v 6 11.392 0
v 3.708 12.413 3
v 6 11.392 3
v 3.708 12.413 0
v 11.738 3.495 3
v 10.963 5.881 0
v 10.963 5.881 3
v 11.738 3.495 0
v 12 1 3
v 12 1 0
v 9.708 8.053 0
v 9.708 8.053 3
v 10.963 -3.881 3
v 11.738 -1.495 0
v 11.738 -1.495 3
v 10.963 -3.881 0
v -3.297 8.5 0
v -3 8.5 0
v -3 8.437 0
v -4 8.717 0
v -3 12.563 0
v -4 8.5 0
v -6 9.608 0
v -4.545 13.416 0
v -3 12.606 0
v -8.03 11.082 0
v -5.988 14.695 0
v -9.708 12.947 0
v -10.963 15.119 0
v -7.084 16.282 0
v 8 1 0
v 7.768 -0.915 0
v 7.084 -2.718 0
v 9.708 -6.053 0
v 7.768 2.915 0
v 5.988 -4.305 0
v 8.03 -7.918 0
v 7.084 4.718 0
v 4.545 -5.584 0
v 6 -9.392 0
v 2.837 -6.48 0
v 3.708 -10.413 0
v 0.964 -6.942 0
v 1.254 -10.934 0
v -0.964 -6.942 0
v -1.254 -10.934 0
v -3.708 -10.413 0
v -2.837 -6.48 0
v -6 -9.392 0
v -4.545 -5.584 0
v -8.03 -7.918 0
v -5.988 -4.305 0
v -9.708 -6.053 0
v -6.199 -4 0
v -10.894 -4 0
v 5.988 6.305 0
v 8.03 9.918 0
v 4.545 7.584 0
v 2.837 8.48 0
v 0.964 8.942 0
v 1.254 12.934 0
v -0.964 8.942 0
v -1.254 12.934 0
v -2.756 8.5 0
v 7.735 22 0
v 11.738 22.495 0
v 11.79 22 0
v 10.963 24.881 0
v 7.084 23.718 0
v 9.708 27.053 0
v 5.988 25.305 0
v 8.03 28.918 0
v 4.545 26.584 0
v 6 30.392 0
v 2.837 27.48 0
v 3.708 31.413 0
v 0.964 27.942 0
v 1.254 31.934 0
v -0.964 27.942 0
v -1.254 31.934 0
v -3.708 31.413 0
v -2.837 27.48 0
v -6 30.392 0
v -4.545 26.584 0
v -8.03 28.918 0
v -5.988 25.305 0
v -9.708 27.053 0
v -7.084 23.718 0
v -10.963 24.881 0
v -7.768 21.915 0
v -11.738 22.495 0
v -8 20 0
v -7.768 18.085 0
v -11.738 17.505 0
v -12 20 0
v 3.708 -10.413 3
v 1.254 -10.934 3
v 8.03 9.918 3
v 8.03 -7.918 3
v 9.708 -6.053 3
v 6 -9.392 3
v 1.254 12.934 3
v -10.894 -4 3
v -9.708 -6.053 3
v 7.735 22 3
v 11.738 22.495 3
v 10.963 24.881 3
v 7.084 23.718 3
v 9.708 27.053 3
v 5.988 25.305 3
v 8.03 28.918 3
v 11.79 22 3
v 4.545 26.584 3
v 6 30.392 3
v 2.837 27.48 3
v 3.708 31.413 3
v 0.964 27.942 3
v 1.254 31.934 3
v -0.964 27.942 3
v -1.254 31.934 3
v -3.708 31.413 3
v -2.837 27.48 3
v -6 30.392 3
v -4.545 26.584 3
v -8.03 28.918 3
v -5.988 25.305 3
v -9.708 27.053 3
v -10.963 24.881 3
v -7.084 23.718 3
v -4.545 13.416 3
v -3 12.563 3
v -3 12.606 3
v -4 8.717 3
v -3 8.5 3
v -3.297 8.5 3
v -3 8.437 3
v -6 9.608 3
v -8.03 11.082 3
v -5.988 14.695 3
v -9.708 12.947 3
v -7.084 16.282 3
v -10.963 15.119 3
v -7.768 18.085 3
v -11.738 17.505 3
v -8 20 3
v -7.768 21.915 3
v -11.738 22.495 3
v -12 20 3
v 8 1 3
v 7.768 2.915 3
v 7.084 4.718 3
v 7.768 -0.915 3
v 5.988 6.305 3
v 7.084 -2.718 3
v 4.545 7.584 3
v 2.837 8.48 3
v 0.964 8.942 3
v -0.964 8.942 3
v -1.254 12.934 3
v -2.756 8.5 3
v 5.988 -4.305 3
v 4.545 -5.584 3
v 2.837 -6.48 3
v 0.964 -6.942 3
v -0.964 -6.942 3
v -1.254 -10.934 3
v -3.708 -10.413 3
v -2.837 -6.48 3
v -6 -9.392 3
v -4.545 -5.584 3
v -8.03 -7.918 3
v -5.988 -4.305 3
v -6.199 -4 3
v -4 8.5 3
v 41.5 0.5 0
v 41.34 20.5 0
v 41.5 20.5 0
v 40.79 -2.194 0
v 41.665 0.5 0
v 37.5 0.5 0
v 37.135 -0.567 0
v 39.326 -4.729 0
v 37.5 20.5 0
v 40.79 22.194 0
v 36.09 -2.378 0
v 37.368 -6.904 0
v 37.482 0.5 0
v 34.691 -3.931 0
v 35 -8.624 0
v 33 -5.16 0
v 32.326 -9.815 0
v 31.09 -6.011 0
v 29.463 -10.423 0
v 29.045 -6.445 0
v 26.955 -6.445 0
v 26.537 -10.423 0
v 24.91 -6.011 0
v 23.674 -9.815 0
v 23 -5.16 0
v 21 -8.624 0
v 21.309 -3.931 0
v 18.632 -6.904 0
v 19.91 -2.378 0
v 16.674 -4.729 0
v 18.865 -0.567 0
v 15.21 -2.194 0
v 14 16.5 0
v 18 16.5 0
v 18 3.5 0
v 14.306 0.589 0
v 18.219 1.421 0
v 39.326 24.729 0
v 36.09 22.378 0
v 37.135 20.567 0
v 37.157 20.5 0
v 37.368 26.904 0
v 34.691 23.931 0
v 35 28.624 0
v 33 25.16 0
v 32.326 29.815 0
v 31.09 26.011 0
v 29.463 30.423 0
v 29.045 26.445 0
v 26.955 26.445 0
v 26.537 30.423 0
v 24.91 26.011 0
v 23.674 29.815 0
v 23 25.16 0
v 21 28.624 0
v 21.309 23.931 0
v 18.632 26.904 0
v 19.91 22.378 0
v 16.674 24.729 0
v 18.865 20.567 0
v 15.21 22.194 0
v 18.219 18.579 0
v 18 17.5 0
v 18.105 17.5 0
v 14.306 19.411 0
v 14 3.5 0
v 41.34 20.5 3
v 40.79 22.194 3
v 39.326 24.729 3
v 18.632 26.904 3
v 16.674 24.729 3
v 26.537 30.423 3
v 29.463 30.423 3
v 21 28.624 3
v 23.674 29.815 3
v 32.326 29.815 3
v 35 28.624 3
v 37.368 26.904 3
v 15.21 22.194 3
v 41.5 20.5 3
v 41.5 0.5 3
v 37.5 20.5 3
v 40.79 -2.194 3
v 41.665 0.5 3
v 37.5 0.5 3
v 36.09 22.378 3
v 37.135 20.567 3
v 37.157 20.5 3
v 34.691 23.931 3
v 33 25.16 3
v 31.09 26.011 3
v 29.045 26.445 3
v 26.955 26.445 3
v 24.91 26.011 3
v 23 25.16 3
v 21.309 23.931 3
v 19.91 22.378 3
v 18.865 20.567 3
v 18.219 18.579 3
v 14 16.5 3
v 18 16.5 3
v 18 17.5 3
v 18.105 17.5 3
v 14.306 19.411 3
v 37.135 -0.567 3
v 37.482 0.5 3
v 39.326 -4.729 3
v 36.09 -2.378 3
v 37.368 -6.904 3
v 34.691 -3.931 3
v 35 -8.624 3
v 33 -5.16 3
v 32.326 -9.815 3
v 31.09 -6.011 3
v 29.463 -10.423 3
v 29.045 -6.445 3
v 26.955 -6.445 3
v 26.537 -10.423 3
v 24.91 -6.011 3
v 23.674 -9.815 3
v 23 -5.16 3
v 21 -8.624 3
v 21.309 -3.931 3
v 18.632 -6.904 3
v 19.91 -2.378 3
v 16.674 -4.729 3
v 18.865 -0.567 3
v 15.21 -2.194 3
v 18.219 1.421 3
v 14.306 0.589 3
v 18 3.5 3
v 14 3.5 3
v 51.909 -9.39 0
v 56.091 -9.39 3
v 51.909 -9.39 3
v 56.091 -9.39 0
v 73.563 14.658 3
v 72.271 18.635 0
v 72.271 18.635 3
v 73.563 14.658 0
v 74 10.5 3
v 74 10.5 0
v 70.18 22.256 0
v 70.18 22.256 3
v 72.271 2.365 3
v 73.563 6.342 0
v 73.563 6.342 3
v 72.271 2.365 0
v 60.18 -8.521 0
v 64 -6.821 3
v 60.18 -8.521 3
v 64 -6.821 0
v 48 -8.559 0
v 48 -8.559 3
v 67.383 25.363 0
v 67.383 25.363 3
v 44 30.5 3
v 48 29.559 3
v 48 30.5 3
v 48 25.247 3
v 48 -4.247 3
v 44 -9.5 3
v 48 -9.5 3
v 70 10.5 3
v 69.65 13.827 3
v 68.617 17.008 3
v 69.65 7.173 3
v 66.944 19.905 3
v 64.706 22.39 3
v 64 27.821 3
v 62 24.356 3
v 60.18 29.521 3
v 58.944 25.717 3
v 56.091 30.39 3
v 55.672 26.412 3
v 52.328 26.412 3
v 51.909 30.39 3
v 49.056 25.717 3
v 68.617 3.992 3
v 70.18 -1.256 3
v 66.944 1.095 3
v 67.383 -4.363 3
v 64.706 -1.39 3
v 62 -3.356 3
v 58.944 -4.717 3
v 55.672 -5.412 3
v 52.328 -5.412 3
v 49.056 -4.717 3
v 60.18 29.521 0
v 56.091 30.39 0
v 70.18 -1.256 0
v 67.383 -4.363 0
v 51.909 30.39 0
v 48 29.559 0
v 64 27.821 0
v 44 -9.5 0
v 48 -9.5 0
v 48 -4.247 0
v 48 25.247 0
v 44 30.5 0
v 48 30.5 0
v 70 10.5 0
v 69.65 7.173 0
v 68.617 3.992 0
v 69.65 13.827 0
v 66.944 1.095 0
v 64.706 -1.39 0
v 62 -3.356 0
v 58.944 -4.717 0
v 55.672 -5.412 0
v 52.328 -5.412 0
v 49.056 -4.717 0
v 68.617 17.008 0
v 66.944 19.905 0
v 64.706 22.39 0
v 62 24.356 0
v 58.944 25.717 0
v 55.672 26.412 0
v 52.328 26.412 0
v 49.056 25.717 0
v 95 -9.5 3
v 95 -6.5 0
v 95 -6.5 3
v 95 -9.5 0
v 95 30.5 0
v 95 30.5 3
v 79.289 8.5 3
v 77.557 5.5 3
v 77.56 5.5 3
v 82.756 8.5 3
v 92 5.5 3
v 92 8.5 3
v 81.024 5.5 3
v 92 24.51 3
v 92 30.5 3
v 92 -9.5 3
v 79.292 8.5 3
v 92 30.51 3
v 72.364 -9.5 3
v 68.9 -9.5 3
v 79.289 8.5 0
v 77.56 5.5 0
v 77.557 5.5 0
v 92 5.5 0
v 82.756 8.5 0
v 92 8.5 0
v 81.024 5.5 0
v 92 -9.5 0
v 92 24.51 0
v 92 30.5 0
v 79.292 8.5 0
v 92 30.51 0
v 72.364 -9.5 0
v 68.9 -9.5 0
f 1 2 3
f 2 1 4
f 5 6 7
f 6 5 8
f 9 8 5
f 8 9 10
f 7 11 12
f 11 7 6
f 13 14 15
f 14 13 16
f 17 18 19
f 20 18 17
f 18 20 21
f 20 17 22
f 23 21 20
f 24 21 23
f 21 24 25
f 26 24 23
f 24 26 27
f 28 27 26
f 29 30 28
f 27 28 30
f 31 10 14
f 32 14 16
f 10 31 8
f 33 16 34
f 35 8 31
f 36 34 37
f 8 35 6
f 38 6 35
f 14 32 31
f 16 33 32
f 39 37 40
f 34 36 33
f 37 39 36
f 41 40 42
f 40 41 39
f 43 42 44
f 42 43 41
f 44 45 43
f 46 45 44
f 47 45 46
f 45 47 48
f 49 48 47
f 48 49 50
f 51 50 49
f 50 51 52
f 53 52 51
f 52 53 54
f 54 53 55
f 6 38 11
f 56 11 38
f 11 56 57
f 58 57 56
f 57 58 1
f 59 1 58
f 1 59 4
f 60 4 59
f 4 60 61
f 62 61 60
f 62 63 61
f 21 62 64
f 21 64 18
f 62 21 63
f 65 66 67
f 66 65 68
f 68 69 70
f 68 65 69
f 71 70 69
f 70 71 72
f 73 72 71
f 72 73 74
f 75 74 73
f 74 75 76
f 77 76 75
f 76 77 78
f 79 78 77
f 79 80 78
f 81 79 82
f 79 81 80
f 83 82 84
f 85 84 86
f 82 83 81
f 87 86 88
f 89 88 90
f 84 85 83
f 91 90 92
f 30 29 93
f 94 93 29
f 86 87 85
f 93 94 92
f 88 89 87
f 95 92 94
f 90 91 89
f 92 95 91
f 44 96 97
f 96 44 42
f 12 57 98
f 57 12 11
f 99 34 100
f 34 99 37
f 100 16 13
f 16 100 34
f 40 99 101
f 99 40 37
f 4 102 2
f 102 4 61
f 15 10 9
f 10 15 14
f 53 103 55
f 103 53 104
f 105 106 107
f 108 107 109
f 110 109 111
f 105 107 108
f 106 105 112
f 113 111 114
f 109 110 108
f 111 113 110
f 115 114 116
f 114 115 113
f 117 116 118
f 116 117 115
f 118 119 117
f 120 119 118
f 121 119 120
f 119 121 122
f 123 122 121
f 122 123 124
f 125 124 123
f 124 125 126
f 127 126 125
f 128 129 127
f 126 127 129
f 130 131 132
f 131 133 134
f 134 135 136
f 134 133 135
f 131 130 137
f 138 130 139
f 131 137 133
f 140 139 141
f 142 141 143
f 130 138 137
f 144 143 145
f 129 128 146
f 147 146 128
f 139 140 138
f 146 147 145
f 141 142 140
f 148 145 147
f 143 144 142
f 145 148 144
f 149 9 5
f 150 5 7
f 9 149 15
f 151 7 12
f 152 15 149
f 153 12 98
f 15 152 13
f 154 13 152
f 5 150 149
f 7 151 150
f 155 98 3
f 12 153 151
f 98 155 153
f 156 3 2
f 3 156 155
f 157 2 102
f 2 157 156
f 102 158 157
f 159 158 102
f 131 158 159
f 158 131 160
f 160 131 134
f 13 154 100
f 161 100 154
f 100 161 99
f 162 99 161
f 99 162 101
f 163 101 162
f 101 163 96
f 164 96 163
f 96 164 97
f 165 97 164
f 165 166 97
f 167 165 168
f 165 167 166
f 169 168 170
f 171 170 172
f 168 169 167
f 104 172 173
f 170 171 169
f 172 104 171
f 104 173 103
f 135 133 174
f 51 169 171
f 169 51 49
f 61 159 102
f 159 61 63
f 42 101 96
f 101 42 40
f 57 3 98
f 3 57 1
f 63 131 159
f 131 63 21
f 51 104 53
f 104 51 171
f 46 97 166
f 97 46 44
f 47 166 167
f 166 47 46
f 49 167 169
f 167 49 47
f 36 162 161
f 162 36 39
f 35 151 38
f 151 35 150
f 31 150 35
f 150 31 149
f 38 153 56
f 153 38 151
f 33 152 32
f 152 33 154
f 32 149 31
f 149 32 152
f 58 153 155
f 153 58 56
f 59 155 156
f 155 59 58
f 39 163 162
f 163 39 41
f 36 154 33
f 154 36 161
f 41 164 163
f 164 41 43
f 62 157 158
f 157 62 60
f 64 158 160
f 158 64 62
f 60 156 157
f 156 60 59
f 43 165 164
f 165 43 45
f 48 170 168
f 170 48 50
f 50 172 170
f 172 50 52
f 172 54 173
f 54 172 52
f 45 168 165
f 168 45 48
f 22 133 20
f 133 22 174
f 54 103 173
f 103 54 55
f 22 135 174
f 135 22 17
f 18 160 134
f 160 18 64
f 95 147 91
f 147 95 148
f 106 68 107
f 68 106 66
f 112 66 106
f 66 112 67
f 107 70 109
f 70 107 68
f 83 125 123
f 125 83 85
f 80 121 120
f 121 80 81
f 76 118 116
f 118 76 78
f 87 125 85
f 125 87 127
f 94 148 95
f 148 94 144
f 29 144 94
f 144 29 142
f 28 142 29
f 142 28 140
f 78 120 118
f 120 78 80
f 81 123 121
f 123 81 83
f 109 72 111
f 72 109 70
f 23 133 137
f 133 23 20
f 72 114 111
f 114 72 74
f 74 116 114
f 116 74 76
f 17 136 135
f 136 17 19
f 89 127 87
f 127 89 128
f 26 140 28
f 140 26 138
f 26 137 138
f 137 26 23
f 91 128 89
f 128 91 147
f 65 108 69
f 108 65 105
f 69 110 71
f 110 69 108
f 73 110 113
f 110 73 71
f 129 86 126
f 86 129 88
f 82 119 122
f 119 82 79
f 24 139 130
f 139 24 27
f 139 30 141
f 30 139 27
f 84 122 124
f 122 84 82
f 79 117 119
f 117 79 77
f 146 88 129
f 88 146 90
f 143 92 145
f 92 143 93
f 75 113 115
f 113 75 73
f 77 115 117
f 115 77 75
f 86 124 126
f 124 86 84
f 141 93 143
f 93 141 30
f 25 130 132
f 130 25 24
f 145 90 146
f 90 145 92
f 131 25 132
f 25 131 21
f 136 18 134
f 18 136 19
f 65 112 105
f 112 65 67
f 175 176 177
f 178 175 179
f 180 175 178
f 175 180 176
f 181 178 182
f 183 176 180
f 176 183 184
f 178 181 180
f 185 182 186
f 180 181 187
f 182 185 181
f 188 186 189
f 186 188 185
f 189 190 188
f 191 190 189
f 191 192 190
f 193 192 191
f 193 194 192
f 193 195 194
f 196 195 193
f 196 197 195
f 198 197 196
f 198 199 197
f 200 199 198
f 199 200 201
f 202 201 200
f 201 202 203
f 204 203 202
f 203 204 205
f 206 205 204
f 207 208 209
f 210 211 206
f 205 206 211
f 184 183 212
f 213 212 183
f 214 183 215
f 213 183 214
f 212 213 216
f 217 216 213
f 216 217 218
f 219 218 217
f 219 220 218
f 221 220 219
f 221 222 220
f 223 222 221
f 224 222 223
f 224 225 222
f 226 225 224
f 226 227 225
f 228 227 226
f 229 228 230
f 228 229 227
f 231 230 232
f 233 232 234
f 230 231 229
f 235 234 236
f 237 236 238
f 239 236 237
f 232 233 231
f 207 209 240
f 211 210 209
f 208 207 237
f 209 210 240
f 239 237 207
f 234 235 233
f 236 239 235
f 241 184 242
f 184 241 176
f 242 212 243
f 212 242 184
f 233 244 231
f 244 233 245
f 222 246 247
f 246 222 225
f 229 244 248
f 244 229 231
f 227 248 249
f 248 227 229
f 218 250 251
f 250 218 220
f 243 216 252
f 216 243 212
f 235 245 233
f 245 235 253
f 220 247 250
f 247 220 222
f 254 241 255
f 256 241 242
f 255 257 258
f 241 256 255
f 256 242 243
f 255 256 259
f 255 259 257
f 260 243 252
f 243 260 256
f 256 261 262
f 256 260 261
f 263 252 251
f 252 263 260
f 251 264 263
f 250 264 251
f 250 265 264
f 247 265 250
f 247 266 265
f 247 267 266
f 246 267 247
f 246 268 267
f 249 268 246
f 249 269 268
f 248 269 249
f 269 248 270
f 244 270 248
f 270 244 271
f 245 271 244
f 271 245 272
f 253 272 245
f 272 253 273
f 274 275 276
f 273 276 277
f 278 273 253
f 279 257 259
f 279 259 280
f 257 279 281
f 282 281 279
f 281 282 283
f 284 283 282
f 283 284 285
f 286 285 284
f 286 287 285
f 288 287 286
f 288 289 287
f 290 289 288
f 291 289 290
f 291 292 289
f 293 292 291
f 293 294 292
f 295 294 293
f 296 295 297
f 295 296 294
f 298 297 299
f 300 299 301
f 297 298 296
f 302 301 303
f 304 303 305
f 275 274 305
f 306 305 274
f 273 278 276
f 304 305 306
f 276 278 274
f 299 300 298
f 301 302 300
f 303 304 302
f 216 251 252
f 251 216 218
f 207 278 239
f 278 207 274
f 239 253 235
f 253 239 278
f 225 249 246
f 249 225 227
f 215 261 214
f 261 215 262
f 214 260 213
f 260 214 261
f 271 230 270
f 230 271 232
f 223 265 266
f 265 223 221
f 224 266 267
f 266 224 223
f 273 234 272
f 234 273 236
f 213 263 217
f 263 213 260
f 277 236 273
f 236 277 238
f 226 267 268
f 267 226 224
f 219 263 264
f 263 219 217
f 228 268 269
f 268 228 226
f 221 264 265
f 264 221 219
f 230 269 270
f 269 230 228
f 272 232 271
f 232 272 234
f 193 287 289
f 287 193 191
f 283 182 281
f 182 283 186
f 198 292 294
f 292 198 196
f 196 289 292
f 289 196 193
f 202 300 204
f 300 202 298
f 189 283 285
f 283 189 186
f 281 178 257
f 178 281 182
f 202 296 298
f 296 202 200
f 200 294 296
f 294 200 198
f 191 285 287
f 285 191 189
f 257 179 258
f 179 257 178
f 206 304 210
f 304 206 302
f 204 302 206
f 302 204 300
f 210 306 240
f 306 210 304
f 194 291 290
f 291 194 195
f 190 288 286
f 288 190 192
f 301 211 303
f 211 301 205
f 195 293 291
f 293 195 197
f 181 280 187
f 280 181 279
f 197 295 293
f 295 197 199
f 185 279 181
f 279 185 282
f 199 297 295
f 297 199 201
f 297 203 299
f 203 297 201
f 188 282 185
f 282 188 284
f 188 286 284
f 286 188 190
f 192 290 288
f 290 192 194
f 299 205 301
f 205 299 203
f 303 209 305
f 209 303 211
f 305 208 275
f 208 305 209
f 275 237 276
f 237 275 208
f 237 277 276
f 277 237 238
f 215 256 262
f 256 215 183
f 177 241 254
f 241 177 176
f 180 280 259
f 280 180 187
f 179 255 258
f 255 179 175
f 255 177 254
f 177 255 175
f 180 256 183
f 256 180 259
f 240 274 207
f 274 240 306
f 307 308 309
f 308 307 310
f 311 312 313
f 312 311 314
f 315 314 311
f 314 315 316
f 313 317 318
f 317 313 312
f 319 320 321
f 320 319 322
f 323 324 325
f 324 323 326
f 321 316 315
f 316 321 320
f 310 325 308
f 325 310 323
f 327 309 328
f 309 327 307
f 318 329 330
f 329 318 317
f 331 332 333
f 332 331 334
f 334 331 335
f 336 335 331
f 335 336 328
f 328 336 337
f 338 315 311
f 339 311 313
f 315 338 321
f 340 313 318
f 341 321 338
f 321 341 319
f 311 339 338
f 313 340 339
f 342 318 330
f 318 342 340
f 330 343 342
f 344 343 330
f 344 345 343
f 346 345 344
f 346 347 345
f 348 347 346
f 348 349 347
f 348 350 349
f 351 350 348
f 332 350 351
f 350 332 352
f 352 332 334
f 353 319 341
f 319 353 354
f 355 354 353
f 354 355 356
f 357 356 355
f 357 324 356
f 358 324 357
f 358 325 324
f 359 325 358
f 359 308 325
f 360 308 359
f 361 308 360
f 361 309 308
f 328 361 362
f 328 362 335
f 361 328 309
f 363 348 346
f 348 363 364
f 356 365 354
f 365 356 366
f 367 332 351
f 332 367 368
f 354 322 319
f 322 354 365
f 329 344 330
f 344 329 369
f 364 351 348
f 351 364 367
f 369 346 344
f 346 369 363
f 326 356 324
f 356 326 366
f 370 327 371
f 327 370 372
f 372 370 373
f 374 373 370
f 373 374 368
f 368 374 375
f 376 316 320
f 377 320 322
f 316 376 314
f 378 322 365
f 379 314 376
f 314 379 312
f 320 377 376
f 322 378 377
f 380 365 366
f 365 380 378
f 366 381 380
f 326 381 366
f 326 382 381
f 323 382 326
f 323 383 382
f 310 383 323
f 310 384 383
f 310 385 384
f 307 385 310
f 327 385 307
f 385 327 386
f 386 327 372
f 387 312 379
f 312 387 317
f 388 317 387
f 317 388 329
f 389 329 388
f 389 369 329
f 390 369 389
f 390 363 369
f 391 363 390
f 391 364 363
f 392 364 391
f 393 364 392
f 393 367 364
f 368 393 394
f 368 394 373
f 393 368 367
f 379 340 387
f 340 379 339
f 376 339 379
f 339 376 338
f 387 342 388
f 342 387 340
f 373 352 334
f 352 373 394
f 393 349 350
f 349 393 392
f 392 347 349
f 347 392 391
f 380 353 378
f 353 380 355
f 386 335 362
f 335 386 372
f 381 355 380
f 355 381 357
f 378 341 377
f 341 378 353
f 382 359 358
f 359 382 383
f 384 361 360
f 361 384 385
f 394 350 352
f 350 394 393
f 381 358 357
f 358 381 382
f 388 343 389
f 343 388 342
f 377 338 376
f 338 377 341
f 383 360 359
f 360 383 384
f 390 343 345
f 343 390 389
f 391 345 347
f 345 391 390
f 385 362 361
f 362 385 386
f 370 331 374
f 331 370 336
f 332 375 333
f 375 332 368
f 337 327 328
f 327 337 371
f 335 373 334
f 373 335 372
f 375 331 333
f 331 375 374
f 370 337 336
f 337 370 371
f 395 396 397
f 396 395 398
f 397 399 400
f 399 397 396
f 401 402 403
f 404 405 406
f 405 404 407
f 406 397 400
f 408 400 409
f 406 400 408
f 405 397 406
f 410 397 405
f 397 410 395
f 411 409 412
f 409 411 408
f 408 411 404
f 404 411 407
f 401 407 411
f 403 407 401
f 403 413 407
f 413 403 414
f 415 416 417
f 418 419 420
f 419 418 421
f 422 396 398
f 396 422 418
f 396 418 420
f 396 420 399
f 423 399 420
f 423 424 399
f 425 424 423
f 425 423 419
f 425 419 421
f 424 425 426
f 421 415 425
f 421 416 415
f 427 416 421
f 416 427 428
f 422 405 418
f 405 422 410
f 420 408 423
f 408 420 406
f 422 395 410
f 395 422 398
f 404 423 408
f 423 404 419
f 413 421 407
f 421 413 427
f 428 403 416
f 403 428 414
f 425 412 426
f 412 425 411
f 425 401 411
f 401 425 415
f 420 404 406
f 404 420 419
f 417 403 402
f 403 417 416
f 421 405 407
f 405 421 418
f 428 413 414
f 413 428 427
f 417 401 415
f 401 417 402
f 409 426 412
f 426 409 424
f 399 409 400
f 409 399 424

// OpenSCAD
//S

difference(){
 translate([0,1,0]) cylinder(3,12,12);
 translate([0,1,-1]) cylinder(5,8,8);
 translate([-14,-4,-1]) cube([10,15,5]);
 translate([-14,-1.5,-1]) cube([12,10,5]);
}

 difference(){

 translate([0,20,0]) cylinder(3,12,12);
 translate([0,20,-1]) cylinder(5,8,8);
 translate([-3,7,-1]) cube([20,15,5]);
}


// буква О
translate([-12,-9.5,0])
union(){
  translate([49.5,10,0]) cube([4,20,3]);
  translate([26,13,0]) cube([4,13,3]);
difference(){
union(){
	
  difference(){
  translate([40,26,0]) cylinder(3,14,14);
  translate([40,26,-1]) cylinder(5,10,10);
  translate([33,10,-1]) cube([20,10,5]);

}

difference(){
  translate([40,13,0]) cylinder(3,14,14);
  translate([40,13,-1]) cylinder(5,10,10);
  translate([32,17,-1]) cube([19,10,5]);
  translate([40,17,-1]) cube(20);
}
}
  translate([30,13,-1]) cube([5,14,5]);
  translate([42,10,-1]) cube(20);
}
}

//D
translate([49,-9.5,0]) 
union(){
   translate([-5,0,0]) cube([4,40,3]);
 difference(){
    translate([5,20,0]) cylinder(3,20,20);
     translate([5,20,-1]) cylinder(6,16,16);
      translate([-15,0,-1]) cube([10,40,6]);
}
}
 
//A
translate([92,-9.5,0])
 union(){
    difference(){
   union(){
    cube([3,40,3]);
   translate([-23.1,0,0]) rotate([0,0,-30])  cube([3,50,3]);
   translate([-15,15,0]) cube([20,3,3]);
}
   translate([-40,-8,-1]) cube([30,8,5]);
   translate([3,3,-1]) cube([10,40,5]);
  translate([-34.65,0,-1]) rotate([0,0,-30]) cube([10,40,5]);
  translate([0,40,-1]) cube(10);
}
}  
